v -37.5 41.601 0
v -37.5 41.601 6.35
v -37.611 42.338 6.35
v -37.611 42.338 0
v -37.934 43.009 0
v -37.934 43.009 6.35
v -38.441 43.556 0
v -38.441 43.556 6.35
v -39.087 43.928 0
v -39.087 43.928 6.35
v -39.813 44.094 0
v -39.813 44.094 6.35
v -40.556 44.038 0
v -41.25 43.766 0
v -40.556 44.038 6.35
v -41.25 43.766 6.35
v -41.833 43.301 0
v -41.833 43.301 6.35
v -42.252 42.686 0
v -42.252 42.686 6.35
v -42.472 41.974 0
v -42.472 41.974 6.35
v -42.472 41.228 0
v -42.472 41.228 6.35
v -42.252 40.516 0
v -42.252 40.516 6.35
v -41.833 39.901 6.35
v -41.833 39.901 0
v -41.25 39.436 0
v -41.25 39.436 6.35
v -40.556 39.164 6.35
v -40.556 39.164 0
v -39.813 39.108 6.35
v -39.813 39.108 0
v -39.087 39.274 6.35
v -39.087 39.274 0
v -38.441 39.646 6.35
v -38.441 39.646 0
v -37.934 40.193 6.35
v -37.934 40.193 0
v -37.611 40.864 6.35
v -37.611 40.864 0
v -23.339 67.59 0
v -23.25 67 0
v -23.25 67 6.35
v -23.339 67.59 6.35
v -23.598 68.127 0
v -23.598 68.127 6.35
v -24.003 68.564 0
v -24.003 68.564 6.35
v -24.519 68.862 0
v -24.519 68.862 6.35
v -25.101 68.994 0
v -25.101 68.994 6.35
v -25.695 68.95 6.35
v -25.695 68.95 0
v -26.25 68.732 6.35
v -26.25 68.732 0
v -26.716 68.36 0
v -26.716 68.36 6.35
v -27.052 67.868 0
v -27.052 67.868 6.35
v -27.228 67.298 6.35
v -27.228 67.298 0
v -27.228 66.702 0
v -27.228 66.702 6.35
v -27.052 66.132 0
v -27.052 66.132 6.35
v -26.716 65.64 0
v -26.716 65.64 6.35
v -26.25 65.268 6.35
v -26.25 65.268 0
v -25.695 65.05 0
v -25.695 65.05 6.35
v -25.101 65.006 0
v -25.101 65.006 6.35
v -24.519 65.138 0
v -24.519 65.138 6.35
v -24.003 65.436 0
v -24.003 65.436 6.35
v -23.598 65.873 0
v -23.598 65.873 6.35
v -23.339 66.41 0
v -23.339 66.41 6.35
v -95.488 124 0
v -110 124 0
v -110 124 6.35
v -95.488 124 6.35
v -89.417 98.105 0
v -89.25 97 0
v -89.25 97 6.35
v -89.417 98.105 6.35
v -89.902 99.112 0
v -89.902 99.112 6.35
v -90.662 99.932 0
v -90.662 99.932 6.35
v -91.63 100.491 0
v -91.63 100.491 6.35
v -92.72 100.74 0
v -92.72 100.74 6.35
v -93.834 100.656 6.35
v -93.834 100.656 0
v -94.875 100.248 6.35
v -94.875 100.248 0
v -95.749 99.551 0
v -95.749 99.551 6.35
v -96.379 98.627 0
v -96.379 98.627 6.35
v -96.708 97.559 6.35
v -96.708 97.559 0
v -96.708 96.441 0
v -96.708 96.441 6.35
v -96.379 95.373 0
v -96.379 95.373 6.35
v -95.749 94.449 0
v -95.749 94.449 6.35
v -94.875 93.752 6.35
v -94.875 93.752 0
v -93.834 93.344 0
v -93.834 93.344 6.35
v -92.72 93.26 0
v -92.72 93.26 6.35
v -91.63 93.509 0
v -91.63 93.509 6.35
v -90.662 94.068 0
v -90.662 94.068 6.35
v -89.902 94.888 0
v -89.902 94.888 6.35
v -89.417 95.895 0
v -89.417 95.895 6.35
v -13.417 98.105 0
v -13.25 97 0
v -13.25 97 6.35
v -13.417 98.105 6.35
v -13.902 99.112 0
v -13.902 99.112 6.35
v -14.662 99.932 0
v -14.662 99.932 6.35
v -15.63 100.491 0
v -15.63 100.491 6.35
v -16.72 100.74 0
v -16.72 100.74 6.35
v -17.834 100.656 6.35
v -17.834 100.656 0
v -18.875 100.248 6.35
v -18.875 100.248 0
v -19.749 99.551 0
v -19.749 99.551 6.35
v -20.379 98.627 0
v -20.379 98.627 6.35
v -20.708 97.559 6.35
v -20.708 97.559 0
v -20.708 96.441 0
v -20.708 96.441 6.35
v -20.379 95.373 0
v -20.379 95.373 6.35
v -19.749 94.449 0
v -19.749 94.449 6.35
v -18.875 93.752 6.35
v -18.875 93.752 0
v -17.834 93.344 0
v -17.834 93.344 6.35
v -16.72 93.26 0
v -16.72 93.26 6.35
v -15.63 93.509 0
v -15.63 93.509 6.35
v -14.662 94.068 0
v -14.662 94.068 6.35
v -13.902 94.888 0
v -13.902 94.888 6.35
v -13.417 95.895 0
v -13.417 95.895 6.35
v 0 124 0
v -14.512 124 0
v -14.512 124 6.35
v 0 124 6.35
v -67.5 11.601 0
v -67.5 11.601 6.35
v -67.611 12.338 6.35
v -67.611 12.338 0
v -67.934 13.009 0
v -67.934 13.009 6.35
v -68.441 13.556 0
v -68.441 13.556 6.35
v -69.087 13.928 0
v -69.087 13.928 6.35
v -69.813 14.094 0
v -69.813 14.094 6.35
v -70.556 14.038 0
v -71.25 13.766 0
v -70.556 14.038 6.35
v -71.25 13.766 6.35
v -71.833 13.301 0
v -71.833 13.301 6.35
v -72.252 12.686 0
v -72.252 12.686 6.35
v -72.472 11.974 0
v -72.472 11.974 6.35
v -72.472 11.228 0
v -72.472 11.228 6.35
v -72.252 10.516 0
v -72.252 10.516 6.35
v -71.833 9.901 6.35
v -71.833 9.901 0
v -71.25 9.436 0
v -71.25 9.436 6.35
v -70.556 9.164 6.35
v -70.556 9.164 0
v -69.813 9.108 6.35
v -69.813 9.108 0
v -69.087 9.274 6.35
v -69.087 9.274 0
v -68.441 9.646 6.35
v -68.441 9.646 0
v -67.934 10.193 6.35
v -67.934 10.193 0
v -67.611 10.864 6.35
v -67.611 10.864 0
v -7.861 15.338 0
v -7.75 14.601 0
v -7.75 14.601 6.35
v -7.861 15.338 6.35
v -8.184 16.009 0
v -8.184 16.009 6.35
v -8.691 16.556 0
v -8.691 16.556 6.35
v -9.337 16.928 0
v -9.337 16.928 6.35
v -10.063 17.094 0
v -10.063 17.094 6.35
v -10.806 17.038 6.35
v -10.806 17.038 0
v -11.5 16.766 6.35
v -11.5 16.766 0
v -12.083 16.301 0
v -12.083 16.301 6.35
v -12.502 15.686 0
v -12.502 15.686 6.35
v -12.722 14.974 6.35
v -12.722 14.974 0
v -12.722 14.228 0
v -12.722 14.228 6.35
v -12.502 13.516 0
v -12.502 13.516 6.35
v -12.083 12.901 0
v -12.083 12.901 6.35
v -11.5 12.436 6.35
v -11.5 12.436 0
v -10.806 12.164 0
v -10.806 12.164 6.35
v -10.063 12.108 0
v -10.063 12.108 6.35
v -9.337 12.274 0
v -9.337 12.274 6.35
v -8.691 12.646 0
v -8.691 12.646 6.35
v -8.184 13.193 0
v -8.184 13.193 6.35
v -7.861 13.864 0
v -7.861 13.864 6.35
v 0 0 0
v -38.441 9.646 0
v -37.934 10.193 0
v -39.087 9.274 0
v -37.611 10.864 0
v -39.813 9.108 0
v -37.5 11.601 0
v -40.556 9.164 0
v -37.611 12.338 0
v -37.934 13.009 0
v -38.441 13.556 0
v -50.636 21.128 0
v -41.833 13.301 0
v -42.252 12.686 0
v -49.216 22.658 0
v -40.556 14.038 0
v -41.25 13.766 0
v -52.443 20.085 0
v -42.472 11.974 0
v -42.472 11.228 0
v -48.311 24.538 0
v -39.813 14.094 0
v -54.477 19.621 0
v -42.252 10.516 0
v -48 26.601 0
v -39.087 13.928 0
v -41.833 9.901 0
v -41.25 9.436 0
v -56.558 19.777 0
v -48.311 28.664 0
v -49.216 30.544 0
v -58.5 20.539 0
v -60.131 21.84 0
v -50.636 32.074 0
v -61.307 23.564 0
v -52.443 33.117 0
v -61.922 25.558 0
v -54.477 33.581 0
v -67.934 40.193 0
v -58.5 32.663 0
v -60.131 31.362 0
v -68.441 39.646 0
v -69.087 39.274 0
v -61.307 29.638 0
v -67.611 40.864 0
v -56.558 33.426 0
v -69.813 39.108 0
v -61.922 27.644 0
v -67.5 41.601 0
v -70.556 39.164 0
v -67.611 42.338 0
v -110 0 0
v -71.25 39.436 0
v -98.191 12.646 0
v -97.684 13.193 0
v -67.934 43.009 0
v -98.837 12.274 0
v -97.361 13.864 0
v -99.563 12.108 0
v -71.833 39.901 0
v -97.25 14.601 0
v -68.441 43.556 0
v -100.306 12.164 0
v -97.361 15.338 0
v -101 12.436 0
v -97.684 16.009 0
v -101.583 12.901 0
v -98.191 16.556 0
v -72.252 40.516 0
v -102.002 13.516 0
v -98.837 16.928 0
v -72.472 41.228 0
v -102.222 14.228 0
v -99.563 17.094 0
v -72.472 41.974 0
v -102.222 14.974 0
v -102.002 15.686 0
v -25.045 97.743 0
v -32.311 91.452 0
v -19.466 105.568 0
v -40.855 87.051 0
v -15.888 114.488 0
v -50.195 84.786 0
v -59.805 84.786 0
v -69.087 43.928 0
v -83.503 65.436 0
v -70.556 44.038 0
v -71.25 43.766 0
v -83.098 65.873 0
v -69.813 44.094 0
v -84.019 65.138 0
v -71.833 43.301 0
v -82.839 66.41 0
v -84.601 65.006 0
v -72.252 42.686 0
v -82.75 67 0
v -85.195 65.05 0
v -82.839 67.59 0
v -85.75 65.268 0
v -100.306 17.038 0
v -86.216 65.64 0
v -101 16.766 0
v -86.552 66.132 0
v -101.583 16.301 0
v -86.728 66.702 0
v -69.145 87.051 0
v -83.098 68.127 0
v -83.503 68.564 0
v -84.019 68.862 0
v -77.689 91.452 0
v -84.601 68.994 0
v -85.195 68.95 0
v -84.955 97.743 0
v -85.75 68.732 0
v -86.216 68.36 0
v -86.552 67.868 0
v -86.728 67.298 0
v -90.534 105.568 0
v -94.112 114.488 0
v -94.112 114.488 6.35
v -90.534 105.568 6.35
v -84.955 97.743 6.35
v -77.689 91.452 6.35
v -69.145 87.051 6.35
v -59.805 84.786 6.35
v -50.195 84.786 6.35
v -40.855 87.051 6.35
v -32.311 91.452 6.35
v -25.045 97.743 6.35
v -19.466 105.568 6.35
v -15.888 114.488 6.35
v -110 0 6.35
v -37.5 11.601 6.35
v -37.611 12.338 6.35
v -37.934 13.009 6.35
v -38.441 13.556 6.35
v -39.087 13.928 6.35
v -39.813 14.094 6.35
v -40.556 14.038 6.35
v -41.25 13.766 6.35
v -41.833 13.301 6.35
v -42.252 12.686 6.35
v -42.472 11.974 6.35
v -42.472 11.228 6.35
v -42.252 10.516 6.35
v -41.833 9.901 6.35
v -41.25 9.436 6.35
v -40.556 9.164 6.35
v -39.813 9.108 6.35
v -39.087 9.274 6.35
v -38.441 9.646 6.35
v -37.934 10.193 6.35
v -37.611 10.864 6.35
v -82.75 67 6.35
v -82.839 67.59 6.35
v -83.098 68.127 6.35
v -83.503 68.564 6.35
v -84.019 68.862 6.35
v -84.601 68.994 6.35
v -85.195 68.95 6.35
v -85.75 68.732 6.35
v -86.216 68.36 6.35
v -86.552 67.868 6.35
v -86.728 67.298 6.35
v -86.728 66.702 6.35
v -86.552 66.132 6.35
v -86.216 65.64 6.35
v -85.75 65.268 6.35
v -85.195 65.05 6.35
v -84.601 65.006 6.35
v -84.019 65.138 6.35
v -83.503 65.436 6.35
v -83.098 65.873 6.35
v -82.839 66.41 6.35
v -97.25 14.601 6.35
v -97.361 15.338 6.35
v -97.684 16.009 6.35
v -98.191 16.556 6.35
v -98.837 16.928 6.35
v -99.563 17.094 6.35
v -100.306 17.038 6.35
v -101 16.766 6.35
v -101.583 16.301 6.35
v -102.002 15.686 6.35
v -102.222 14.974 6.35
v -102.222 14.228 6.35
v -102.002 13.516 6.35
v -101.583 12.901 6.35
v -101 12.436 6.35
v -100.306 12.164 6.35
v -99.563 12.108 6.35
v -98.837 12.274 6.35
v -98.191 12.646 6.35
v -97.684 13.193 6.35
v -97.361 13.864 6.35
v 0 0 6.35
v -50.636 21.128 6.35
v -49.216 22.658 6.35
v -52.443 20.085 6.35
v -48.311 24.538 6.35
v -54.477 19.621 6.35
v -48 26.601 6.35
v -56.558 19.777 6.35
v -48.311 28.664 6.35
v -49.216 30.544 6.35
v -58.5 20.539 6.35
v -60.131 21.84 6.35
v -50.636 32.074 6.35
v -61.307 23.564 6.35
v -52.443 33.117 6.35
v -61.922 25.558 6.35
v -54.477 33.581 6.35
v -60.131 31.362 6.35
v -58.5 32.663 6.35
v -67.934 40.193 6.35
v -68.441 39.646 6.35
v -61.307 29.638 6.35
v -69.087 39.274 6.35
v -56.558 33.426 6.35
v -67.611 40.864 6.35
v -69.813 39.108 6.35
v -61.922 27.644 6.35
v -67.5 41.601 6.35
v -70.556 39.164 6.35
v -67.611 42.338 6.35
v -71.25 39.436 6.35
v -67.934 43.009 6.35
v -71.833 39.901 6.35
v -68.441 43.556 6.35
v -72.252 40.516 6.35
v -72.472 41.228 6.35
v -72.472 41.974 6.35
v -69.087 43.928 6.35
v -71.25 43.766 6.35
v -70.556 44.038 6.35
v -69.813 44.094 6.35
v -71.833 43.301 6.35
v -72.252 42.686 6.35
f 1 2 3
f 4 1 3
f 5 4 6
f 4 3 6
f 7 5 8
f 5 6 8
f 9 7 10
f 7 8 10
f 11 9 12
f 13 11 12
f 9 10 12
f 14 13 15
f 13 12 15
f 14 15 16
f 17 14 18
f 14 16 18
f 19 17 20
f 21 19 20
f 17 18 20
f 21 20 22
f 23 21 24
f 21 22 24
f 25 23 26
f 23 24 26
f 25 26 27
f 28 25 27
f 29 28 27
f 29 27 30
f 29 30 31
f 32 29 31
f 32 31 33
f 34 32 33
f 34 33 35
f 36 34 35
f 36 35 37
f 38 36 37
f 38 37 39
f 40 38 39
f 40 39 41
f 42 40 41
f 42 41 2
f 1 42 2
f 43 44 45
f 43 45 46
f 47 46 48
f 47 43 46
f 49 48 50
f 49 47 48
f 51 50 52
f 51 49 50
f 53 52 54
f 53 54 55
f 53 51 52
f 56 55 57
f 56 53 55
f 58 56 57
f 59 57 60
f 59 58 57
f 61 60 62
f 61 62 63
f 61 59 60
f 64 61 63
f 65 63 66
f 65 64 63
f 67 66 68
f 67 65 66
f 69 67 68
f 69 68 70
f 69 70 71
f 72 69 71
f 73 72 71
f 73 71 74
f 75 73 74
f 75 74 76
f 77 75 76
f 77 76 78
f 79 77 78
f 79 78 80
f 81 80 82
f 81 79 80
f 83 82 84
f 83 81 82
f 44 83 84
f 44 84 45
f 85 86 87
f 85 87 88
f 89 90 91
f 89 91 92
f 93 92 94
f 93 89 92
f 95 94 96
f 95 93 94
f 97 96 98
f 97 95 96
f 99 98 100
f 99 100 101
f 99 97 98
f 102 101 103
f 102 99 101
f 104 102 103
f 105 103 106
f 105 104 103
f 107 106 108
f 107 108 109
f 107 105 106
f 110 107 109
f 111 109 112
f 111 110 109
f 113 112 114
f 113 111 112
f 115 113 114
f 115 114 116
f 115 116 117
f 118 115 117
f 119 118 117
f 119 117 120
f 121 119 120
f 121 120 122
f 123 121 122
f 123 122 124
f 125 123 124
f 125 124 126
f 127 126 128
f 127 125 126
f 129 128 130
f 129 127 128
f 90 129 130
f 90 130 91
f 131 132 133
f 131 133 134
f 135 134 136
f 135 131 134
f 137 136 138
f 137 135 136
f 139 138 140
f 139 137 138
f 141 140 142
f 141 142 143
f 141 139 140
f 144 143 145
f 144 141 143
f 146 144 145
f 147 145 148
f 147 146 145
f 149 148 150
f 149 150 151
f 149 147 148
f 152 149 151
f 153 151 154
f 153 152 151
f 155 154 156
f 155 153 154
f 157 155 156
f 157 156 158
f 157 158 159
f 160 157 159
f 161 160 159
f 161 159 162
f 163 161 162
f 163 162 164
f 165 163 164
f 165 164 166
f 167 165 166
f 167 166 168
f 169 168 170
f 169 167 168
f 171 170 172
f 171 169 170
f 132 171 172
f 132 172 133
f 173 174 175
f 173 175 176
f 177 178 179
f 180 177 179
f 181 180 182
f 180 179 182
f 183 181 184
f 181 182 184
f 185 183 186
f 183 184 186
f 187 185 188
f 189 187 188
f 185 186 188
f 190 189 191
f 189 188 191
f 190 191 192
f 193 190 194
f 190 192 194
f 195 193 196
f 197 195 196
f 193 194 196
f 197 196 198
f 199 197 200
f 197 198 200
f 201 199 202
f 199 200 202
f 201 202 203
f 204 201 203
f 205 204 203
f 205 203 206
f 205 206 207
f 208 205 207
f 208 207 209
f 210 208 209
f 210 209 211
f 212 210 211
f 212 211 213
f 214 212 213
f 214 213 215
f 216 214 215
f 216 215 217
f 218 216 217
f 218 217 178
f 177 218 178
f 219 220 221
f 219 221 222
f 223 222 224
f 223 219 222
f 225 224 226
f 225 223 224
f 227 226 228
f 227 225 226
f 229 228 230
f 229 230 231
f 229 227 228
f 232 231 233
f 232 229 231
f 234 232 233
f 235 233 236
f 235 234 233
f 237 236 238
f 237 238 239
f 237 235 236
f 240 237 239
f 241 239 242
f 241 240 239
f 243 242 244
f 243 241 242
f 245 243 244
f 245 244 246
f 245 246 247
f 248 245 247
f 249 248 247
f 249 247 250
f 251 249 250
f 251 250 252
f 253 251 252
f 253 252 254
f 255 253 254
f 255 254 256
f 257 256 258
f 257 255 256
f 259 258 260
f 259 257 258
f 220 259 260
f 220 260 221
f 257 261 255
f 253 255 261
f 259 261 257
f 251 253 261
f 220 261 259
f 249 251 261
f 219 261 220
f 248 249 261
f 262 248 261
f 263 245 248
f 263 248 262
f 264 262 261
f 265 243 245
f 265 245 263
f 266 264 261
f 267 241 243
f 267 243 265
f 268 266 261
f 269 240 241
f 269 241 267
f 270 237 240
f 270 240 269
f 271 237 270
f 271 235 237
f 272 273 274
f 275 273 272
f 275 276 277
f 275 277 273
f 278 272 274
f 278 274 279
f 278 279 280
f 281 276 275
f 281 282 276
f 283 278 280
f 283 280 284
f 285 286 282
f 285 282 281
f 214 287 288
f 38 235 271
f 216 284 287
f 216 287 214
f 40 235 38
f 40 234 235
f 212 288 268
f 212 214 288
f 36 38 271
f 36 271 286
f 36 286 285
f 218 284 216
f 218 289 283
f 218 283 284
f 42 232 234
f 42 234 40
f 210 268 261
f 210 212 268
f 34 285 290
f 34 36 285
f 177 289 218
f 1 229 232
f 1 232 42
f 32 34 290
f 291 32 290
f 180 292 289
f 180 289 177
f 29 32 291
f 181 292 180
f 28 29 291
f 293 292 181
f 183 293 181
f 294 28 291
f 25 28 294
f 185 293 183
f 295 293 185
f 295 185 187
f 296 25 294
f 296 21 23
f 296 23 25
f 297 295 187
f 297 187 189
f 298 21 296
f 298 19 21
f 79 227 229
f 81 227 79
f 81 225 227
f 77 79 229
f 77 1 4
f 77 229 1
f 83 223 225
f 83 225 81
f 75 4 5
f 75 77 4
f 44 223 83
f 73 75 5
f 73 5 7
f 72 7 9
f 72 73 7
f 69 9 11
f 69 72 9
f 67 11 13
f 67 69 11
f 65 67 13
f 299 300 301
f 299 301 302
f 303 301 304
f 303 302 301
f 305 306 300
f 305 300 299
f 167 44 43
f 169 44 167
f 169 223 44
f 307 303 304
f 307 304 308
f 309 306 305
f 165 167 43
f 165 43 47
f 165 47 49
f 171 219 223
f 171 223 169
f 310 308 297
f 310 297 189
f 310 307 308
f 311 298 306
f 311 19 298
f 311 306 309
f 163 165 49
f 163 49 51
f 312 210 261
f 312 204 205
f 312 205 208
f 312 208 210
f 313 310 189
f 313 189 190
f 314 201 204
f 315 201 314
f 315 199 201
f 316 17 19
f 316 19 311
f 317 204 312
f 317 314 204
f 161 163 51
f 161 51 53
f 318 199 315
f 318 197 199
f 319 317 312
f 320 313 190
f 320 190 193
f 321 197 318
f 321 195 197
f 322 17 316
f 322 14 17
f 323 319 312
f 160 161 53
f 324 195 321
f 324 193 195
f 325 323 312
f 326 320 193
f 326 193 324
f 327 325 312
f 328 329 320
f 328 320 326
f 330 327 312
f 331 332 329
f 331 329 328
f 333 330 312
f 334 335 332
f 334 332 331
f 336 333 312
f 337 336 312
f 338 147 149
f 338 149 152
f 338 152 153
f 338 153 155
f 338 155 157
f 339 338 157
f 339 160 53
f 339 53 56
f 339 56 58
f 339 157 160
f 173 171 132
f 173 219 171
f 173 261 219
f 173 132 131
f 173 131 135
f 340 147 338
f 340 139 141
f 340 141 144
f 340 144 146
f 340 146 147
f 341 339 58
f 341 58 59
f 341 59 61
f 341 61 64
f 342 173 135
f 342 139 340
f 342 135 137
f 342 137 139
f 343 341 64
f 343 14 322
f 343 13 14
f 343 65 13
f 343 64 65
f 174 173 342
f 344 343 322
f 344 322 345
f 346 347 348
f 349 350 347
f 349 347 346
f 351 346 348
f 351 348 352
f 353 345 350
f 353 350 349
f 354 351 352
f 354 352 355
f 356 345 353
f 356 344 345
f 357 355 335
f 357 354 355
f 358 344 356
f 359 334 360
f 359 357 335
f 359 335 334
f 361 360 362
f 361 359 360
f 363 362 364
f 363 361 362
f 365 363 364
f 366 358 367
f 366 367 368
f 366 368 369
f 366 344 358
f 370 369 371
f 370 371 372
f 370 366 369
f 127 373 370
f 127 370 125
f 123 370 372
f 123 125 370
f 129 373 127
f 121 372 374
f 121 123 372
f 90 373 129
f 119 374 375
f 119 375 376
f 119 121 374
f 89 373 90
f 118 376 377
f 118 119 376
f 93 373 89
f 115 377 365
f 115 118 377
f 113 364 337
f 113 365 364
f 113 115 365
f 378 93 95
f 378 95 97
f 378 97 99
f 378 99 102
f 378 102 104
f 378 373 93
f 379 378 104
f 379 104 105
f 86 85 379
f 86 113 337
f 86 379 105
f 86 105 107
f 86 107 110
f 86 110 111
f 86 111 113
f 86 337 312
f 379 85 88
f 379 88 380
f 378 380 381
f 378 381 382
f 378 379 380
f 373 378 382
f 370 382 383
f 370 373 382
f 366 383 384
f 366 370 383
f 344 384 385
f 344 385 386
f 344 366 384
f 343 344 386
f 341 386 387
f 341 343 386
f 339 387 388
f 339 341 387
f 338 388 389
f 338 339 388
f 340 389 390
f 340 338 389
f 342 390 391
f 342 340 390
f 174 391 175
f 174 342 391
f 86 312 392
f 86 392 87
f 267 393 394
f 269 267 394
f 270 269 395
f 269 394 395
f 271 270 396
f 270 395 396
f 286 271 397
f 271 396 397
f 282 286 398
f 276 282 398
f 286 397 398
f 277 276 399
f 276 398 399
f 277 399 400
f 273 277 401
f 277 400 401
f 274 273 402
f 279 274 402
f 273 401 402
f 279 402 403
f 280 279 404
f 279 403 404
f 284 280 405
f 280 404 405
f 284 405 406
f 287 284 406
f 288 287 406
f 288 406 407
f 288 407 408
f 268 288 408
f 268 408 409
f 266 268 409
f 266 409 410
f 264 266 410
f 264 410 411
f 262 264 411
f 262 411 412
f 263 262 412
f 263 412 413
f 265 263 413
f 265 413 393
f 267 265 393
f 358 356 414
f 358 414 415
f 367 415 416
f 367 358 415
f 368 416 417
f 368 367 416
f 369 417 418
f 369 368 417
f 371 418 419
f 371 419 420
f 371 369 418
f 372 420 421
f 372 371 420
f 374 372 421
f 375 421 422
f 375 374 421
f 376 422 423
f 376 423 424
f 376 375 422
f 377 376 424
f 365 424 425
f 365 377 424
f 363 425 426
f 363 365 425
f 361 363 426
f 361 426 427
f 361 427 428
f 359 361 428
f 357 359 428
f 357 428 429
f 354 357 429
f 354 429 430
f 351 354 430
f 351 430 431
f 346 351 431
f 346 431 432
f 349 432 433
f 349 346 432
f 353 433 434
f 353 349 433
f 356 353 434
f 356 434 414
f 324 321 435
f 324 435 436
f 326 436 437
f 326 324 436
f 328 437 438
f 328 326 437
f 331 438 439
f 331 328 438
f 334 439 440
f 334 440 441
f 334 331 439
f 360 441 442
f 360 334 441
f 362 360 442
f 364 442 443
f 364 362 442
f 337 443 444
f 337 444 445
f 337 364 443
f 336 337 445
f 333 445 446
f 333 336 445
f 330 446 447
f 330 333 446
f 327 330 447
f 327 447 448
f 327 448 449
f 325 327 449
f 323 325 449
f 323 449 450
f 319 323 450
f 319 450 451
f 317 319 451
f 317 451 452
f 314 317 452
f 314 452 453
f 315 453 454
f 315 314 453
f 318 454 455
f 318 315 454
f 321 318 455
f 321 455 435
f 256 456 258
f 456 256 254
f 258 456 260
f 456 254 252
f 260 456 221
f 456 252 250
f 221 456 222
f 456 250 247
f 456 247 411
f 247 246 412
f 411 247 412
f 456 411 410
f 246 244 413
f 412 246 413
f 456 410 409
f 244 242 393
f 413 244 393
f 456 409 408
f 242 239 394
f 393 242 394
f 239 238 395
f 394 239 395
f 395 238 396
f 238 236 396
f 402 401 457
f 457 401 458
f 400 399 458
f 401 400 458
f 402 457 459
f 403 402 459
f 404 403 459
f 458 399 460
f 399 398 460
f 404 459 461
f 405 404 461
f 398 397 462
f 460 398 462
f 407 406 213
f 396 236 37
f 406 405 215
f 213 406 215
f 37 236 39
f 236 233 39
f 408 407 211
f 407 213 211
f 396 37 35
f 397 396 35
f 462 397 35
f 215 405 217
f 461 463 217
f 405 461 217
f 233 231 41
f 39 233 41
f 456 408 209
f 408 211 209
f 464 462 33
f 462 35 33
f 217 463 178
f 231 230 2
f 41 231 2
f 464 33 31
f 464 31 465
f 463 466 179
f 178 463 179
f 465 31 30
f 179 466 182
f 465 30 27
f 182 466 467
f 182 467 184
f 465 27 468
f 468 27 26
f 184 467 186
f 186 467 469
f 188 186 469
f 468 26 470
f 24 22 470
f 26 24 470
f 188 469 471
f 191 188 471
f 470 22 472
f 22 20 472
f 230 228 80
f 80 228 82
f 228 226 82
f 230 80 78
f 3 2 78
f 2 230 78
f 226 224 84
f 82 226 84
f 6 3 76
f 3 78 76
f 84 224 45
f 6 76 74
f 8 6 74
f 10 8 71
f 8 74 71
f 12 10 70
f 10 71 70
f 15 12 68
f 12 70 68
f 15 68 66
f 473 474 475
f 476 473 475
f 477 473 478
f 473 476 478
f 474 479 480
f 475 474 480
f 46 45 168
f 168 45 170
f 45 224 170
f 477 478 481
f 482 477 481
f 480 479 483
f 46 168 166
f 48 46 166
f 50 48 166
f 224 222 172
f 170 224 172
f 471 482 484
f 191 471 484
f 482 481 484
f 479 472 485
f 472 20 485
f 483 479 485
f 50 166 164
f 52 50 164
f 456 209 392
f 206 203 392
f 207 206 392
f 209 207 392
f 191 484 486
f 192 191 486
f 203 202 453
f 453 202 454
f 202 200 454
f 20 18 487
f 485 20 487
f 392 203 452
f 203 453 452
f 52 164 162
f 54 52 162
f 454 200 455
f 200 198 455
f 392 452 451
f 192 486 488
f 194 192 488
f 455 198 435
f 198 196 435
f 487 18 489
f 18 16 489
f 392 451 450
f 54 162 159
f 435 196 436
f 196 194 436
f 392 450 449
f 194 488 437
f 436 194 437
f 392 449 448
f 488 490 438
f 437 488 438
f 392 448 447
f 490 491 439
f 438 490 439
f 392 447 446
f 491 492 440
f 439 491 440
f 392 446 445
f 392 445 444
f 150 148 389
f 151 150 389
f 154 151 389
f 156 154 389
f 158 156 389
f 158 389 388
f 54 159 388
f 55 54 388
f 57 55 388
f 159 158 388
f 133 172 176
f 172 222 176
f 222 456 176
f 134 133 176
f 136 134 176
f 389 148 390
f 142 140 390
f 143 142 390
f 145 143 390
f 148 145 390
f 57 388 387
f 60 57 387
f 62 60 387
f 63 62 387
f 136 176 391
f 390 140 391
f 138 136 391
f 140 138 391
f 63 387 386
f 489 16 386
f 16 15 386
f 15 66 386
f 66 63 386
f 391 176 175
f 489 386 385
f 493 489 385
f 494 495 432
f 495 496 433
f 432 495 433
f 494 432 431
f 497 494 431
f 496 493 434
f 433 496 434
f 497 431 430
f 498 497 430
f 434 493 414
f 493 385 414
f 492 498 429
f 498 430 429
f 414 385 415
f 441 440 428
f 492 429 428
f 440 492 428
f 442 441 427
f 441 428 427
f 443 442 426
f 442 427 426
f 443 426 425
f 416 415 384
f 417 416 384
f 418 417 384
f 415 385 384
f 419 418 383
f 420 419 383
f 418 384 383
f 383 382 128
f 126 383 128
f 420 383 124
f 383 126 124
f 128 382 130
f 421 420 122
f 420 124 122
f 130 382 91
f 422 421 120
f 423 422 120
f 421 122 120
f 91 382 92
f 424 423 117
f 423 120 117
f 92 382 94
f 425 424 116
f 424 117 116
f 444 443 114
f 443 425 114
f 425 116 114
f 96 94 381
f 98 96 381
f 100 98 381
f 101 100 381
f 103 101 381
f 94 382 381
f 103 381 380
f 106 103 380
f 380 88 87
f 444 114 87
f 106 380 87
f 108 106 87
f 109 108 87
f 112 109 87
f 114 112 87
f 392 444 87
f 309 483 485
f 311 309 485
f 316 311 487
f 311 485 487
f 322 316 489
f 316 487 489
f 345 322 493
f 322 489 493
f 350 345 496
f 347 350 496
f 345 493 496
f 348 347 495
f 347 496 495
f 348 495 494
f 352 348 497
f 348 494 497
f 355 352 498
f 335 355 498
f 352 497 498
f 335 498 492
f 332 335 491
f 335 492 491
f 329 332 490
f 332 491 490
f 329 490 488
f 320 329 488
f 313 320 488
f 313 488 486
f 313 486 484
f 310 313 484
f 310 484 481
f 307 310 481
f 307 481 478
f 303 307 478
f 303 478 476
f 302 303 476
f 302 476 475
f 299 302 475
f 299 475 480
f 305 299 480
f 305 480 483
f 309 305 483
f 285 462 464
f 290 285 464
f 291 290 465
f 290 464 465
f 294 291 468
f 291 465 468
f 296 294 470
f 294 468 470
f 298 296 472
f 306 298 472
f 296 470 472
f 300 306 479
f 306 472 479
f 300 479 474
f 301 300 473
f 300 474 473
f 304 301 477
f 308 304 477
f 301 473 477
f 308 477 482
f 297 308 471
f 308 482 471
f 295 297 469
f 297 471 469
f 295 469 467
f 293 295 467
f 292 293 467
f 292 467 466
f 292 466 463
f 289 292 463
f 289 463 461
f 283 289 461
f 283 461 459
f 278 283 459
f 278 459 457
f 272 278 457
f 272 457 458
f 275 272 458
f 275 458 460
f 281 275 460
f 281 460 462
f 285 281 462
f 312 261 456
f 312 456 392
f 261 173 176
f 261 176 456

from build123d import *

# Parameters (mm, degrees)
CROQUIS1_R              = 3.75
CROQUIS1_R_2            = 2
CROQUIS1_R_3            = 2.5
SALIENTE_EXTRUIR1_DEPTH = 6.35
CROQUIS2_R              = 7
CROQUIS2_R_2            = 2.5
CORTAR_EXTRUIR1_DEPTH   = 10


with BuildPart() as part:
    # Croquis1 → Saliente-Extruir1 (new body)
    with BuildSketch(Plane.XY):
        with BuildLine():
            Line((0, 0), (-110, 0))
            Line((-110, 0), (-110, 124))
            Line((-110, 124), (-95.487652439, 124))
            ThreePointArc((-95.487652439, 124), (-55, 84.5), (-14.512347561, 124))
            Line((-14.512347561, 124), (0, 124))
            Line((0, 124), (0, 0))
        make_face()
        with Locations((-93, 97)):
            Circle(CROQUIS1_R, mode=Mode.SUBTRACT)
        with Locations((-84.75, 67)):
            Circle(CROQUIS1_R_2, mode=Mode.SUBTRACT)
        with Locations((-25.25, 67)):
            Circle(CROQUIS1_R_2, mode=Mode.SUBTRACT)
        with Locations((-17, 97)):
            Circle(CROQUIS1_R, mode=Mode.SUBTRACT)
        with Locations((-99.75, 14.601014199)):
            Circle(CROQUIS1_R_3, mode=Mode.SUBTRACT)
        with Locations((-10.25, 14.601014199)):
            Circle(CROQUIS1_R_3, mode=Mode.SUBTRACT)
    extrude(amount=SALIENTE_EXTRUIR1_DEPTH)

    # Croquis2 → Cortar-Extruir1 (cut)
    with BuildSketch(Plane.XY.offset(6.35)):
        with Locations((-55, 26.601014199)):
            Circle(CROQUIS2_R)
        with Locations((-40, 11.601014199)):
            Circle(CROQUIS2_R_2)
        with Locations((-70, 11.601014199)):
            Circle(CROQUIS2_R_2)
        with Locations((-70, 41.601014199)):
            Circle(CROQUIS2_R_2)
        with Locations((-40, 41.601014199)):
            Circle(CROQUIS2_R_2)
    extrude(amount=-CORTAR_EXTRUIR1_DEPTH, mode=Mode.SUBTRACT)


solid = part.part
